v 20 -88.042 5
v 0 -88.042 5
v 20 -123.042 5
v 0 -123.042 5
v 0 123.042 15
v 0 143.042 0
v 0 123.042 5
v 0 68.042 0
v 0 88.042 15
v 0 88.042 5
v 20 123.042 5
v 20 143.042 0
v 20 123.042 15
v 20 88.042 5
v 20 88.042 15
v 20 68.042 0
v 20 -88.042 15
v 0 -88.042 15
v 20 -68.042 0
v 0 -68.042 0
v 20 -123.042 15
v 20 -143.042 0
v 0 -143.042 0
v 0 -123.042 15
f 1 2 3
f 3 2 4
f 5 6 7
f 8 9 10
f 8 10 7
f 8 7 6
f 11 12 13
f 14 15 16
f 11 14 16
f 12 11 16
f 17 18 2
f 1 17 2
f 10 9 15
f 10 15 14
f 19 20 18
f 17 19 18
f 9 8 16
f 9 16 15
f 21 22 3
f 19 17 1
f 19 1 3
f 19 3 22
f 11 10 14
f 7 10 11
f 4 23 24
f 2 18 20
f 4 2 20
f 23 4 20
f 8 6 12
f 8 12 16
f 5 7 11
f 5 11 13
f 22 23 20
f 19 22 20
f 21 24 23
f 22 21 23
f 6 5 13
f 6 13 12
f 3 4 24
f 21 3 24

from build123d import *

# Parameters (mm, degrees)
F1_DEPTH = 20


with BuildPart() as f1:
    # F0 (on Right) → F1 (new body)
    with BuildSketch(Plane.YZ):
        Polygon((-143.042043, 0), (-68.042043, 0), (-88.042043, 15), (-88.042043, 5), (-123.042043, 5), (-123.042043, 15), align=None)
    extrude(amount=F1_DEPTH)


with BuildPart() as f2_1:
    # F2: instance of F1
    add(f1.part.mirror(Plane.XZ))


solid = Compound([f1.part, f2_1.part])
